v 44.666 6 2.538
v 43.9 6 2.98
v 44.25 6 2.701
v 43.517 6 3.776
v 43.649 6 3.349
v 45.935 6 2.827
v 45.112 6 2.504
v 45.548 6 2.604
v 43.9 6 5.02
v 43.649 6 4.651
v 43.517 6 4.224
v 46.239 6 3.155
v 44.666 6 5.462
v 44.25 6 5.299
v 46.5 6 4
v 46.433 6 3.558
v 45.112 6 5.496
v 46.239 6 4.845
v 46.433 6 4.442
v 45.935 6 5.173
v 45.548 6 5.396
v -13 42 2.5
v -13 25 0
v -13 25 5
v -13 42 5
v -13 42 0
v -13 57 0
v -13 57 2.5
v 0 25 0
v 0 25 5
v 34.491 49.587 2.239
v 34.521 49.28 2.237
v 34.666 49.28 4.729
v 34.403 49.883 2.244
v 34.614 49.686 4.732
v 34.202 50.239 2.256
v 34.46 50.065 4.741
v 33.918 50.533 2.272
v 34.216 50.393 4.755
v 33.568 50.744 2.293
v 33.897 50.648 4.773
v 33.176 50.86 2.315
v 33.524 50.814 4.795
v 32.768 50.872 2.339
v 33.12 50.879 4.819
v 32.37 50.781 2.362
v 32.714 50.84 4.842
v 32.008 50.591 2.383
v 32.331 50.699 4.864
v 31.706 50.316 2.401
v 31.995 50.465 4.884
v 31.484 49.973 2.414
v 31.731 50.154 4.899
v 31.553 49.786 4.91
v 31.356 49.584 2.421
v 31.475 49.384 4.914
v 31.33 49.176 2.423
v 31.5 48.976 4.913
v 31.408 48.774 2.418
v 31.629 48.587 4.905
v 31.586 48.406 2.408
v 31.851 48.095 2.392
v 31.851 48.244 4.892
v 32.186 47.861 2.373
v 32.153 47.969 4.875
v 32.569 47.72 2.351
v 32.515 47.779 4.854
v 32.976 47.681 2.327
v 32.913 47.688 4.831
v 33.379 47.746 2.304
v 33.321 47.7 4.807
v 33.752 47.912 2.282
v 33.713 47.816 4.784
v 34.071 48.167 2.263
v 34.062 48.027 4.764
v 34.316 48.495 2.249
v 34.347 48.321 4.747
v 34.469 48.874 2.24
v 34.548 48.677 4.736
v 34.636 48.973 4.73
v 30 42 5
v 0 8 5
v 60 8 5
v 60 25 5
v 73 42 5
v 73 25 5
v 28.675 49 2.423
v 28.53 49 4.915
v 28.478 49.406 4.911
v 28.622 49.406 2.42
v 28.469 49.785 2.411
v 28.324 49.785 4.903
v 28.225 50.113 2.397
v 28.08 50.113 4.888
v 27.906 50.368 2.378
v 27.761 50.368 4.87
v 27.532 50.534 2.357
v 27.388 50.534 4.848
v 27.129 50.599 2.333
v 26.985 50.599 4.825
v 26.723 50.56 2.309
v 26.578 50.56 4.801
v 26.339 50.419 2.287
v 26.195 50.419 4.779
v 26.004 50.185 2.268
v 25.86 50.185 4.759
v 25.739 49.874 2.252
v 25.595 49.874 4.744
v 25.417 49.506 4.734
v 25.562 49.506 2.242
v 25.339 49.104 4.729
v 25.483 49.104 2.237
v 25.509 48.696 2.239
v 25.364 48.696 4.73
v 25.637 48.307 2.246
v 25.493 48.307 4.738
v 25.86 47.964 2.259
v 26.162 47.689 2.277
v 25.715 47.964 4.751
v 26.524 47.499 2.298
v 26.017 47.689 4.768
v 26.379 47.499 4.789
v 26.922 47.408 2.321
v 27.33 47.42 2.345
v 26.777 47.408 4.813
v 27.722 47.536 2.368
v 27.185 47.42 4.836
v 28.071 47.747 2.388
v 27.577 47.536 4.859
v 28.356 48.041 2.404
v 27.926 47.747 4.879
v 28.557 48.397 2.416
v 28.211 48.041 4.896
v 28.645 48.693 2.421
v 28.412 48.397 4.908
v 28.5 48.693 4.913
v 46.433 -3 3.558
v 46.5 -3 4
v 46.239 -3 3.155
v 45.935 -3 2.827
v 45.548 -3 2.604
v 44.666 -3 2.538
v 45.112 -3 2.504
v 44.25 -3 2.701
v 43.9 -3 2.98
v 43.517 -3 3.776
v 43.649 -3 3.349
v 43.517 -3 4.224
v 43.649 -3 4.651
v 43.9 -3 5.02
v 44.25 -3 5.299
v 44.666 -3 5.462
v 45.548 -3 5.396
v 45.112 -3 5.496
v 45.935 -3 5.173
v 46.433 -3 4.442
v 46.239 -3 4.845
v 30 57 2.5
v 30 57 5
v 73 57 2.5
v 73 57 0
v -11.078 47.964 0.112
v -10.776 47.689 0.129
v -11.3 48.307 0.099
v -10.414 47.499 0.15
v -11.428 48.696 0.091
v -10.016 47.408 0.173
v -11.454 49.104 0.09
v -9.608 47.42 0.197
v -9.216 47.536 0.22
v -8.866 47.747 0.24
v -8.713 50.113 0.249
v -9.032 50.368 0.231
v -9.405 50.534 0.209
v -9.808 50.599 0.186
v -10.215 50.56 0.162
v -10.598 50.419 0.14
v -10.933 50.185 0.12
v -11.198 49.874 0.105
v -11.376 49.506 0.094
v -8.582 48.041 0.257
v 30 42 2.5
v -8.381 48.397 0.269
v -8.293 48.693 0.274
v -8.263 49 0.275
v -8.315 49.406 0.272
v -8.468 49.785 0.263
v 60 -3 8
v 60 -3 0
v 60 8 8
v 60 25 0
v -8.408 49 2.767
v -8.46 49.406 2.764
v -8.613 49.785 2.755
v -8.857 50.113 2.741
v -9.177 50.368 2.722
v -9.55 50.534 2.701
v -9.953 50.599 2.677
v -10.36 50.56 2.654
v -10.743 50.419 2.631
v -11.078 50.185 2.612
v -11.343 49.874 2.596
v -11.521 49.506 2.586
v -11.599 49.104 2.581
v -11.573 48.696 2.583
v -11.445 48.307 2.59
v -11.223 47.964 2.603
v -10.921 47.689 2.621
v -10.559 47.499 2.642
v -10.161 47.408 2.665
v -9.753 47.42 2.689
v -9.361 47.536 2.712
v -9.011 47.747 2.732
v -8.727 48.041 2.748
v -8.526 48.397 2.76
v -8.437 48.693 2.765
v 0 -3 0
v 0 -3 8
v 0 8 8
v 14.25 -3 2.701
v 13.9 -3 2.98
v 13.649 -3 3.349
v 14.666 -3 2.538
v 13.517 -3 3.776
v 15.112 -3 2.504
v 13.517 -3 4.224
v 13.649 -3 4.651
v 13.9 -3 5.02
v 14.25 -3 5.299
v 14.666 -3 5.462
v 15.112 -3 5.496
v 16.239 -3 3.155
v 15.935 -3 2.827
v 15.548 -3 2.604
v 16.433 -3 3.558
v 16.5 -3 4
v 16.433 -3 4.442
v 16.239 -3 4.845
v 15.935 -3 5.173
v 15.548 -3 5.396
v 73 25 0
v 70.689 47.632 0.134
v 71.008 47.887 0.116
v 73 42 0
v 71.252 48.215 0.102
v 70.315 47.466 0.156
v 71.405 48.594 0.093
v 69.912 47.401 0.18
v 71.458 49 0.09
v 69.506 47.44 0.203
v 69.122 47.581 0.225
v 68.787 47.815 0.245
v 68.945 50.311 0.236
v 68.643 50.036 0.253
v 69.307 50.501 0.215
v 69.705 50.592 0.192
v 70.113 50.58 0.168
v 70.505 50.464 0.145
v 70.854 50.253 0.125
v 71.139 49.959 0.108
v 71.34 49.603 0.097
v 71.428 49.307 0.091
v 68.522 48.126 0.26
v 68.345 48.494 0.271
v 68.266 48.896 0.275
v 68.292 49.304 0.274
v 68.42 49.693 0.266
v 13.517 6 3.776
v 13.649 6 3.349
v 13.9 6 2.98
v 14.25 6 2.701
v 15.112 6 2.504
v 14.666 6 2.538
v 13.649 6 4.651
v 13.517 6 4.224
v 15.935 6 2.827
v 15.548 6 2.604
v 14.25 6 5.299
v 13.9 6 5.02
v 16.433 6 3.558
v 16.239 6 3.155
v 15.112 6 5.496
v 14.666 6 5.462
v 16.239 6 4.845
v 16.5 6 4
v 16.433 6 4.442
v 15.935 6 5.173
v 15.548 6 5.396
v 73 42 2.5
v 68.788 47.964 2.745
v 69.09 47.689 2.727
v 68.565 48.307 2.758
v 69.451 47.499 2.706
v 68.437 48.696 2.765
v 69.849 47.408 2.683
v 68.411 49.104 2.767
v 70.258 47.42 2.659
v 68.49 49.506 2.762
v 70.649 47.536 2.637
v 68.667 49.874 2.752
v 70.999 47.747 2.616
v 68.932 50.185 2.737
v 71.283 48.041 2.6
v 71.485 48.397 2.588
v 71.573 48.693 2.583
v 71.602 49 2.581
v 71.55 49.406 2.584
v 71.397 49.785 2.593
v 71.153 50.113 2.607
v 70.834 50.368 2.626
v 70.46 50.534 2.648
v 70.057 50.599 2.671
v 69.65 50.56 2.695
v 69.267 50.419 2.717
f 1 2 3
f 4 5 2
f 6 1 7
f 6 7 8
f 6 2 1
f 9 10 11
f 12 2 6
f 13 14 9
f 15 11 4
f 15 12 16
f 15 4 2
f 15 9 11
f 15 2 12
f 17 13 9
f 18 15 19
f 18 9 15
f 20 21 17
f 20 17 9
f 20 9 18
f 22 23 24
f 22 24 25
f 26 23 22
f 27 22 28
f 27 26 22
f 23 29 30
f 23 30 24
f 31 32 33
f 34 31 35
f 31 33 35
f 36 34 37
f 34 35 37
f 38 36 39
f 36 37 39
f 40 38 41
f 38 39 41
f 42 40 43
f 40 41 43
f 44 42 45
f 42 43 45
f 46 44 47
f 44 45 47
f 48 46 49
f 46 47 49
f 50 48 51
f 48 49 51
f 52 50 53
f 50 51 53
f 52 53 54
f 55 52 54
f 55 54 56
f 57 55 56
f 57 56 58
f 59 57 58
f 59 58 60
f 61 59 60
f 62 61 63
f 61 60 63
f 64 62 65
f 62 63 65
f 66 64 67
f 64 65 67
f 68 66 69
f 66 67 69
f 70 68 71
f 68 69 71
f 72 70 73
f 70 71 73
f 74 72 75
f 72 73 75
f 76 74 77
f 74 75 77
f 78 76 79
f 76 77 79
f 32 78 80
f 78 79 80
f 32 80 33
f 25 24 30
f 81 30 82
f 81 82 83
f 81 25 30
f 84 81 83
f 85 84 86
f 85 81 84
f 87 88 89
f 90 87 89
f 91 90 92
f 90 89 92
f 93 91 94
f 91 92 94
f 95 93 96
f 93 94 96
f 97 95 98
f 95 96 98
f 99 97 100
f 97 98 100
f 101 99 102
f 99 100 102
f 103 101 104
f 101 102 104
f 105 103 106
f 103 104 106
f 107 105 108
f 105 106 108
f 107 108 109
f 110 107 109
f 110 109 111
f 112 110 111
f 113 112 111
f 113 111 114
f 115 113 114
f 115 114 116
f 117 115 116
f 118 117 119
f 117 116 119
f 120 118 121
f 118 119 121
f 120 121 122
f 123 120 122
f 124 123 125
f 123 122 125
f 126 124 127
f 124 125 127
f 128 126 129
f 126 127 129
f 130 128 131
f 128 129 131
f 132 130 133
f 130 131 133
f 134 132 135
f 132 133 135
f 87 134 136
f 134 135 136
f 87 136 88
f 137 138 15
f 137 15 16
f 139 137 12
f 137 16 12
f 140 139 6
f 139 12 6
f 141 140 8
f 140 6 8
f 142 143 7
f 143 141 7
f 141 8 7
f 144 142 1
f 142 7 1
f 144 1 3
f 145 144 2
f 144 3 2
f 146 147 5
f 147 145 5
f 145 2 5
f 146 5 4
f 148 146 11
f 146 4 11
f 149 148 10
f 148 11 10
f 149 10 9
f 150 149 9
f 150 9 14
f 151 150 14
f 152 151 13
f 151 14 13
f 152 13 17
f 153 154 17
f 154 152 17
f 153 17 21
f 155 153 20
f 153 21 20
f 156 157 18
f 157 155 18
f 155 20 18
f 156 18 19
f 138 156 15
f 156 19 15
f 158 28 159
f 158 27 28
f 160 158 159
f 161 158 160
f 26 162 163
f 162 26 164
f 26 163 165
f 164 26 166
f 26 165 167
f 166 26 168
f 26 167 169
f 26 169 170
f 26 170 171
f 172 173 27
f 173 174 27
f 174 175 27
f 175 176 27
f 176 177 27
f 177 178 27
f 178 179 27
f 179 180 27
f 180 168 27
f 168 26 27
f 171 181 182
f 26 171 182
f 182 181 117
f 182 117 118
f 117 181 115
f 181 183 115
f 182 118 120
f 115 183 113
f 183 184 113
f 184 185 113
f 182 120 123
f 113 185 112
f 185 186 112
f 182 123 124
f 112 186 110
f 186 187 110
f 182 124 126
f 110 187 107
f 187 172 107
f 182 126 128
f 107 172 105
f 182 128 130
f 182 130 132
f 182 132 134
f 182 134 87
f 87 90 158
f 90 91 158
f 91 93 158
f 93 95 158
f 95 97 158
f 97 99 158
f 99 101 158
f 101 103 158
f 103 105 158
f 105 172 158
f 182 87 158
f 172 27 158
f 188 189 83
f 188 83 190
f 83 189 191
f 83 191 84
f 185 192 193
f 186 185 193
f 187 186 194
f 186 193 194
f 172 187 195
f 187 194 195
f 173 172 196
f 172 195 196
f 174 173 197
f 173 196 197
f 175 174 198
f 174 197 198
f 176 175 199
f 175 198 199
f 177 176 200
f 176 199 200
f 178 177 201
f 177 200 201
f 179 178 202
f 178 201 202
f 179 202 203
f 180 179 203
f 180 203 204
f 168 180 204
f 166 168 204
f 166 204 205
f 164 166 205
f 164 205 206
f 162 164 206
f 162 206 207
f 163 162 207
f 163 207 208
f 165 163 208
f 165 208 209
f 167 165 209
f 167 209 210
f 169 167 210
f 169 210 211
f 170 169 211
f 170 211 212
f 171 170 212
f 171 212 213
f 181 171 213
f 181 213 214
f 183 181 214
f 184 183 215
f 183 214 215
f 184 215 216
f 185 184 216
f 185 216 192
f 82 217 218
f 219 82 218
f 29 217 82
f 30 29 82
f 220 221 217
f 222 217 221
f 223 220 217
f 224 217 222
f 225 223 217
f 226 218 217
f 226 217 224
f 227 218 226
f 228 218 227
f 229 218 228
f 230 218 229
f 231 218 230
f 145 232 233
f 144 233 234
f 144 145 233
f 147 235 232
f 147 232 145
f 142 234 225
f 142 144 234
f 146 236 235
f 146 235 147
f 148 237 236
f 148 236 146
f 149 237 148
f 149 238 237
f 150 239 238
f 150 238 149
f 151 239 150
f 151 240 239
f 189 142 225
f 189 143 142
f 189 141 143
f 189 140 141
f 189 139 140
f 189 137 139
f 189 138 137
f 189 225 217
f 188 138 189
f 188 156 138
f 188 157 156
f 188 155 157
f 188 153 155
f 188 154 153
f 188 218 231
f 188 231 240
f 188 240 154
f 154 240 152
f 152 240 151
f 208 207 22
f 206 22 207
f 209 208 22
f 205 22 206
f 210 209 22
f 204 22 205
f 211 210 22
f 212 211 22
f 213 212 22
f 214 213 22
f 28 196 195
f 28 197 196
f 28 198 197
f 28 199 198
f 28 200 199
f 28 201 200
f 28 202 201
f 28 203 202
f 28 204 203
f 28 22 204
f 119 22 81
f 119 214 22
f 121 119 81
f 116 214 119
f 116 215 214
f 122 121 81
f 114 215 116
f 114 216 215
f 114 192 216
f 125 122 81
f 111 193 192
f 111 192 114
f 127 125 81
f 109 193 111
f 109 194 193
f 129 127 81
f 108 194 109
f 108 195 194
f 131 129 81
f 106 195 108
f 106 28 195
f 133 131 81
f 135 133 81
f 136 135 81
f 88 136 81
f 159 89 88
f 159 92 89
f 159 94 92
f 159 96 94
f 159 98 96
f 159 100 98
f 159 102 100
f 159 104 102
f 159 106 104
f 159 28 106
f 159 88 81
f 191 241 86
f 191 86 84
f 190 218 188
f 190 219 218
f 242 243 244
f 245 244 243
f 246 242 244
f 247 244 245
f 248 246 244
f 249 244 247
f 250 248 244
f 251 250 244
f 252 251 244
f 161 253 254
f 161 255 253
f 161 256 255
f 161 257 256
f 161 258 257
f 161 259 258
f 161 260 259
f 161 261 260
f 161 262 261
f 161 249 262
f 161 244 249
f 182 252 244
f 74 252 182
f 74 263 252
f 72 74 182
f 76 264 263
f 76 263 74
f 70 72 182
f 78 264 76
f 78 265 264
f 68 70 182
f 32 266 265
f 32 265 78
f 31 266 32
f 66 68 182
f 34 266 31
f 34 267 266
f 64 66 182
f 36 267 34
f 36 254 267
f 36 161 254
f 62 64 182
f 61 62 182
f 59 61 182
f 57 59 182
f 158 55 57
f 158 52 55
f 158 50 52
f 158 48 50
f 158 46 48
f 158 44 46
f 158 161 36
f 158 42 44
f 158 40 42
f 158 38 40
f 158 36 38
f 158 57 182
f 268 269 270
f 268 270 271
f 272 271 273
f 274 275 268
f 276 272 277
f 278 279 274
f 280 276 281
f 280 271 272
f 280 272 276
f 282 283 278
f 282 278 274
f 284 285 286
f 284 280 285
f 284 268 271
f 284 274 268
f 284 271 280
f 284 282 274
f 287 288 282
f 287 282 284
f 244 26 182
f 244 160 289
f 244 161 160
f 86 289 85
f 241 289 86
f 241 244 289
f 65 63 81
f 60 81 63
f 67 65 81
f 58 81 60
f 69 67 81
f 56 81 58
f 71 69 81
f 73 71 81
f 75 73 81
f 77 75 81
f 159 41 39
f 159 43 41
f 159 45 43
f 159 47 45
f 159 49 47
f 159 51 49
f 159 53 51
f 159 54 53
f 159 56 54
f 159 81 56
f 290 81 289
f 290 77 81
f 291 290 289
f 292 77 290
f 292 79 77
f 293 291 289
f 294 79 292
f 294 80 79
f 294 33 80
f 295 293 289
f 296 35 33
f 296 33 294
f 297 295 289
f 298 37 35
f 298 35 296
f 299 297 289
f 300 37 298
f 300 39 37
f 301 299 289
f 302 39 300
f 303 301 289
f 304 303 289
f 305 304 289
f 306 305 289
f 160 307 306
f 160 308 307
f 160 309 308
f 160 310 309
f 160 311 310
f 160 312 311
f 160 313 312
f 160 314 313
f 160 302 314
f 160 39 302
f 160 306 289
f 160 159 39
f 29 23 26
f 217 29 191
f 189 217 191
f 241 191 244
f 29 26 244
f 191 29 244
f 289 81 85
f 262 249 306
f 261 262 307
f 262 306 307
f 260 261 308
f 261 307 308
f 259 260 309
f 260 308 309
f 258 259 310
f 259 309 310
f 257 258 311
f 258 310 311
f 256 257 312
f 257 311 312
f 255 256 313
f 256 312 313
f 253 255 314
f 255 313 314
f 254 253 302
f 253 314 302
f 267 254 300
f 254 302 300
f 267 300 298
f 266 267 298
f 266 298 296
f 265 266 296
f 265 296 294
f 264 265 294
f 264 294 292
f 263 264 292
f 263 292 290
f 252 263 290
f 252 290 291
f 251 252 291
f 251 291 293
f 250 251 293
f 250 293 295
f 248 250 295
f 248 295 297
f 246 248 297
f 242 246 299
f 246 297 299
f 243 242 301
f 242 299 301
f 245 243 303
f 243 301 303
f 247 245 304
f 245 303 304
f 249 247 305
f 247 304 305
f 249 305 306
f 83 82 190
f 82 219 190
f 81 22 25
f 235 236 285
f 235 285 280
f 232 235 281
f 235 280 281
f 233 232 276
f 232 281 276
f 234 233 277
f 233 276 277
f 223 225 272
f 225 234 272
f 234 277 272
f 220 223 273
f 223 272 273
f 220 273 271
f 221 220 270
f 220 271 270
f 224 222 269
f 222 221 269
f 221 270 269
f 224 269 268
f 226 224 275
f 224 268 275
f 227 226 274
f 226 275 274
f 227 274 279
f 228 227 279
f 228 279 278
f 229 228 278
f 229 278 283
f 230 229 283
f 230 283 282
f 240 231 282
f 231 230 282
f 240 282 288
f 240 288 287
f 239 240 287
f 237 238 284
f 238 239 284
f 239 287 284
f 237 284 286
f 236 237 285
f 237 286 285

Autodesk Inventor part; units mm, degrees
ref_plane "YZ Plane" through (0, 0, 0) normal (1, 0, 0) x (0, 1, 0)
ref_plane "XZ Plane" through (0, 0, 0) normal (0, 1, 0) x (-1, 0, 0)
ref_plane "XY Plane" through (0, 0, 0) normal (0, 0, 1) x (1, 0, 0)
sketch "스케치1" plane through (0, 0, 0) normal (0, 0, 1) x (1, 0, 0)
  line L0 (0, 0) -> (60, 0)
  line L1 (60, 0) -> (60, 25)
  line L2 (60, 57) -> (0, 57)
  line L3 (0, 25) -> (0, 0)
  line L4 (-13, 57) -> (73, 57)
  line L5 (73, 57) -> (73, 25)
  line L6 (-13, 25) -> (-13, 57)
  line L7 (73, 25) -> (60, 25)
  line L8 (0, 25) -> (-13, 25)
  dimension "d0" = 60
  dimension "d1" = 57
  dimension "d3" = 86
  dimension "d4" = 32
  dimension "d5" = 13
extrude "돌출1" add sketch "스케치1" along normal blind 8
sketch "스케치2" plane through (0, 0, 8) normal (0, 0, 1) x (1, 0, 0)
  line L0 (0, 0) -> (60, 0) projected
  line L1 (60, 0) -> (60, 25) projected
  line L2 (60, 25) -> (73, 25) projected
  line L3 (73, 25) -> (73, 57) projected
  line L4 (73, 57) -> (-13, 57) projected
  line L5 (-13, 57) -> (-13, 25) projected
  line L6 (-13, 25) -> (0, 25) projected
  line L7 (0, 25) -> (0, 0) projected
  line L8 (0, 25) -> (0, 0) projected
  line L9 (0, 8) -> (60, 8)
  line L10 (60, 8) -> (60, 0)
  line L11 (60, 0) -> (0, 0)
  line L12 (0, 0) -> (0, 8)
  dimension "d9" = 8
  dimension "d10" = 0
extrude "돌출2" cut sketch "스케치2" against normal blind 3 contours L7 L6 L5 L4 L3 L2 L1 L9
sketch "스케치4" plane through (0, 0, 0) normal (0, -1, 0) x (1, 0, 0)
  line L0 (0, 0) -> (60, 0) projected
  line L1 (60, 0) -> (60, 8) projected
  line L2 (0, 8) -> (60, 8) projected
  line L3 (0, 0) -> (0, 8) projected
  circle A0 centre (45, 4) radius 1.5
  circle A1 centre (15, 4) radius 1.5
  dimension "d15" = 3
  dimension "d16" = 3
  dimension "d17" = 4
  dimension "d18" = 15
  dimension "d19" = 4
  dimension "d20" = 15
extrude "돌출4" cut sketch "스케치4" against normal blind 6 contours A0 | A1
sketch "스케치11" plane through (-13, 57, 5) normal (0, 1, 0) x (1, 0, 0)
  line L0 (0, 0) -> (86, 0) projected
  line L1 (86, 5) -> (86, 0) projected
  line L2 (86, 5) -> (0, 5) projected
  line L3 (0, 5) -> (0, 0) projected
  line L4 (0, 2.5) -> (43, 0)
  line L5 (0, 0) -> (86, 0) projected
  line L6 (73, 5) -> (86, 5) projected
  line L7 (43, 0) -> (43, 2.5)
  line L8 (86, 5) -> (0, 5) projected
  line L9 (86, 5) -> (43, 2.5)
  line L10 (0, 5) -> (43, 2.5)
  line L11 (43, 0) -> (86, 2.5)
  line L12 (86, 5) -> (86, 0) projected
  line L13 (86, 2.5) -> (86, 5)
  point P0 (13, 5)
extrude "돌출7" cut sketch "스케치11" against normal blind 15 contours L3 L4 L0 | L11 L1 L0 | L10 L2 L9
sketch "스케치13" plane through (-13, 57, 2.5) normal (-0.058, 0, 0.9983) x (0.9983, 0, 0.058)
  circle A0 centre (3, -8) radius 1.6
  circle A1 centre (40, -8) radius 1.6
  line L0 (0, -15) -> (0, 0) projected
  line L1 (0, 0) -> (43.0726, 0) projected
  line L2 (42.9275, -15) -> (-0.1451, -15) projected
  point P0 (12.833, -57)
  dimension "d53" = 3.2
  dimension "d54" = 3.2
  dimension "d55" = 37
  dimension "d56" = 3
  dimension "d57" = 8
  dimension "d58" = 7
extrude "돌출8" cut sketch "스케치13" against normal blind 3
sketch "스케치15" plane through (0, 0, 0) normal (0, -1, 0) x (1, 0, 0)
  circle A0 centre (45, 4) radius 1.5 projected
  circle A1 centre (15, 4) radius 1.5 projected
  line L0 (0, 0) -> (60, 0) projected
  line L1 (60, 0) -> (60, 8) projected
  line L2 (0, 8) -> (60, 8) projected
  line L3 (0, 0) -> (0, 8) projected
extrude "돌출11" add sketch "스케치15" along normal blind 3
sketch "스케치16" plane through (30, 42, 5) normal (0.058, 0, 0.9983) x (0.9983, 0, -0.058)
  circle A0 centre (40.0726, 7) radius 1.6
  circle A1 centre (3.0737, 7.28) radius 1.6
  line L0 (0, 15) -> (43.0726, 15) projected
  line L1 (43.0726, 15) -> (43.0726, 0) projected
  point P0 (-29.6592, -42)
  dimension "d71" = 3.2
  dimension "d72" = 3.2
  dimension "d73" = 8
  dimension "d74" = 7.72
  dimension "d75" = 37
  dimension "d76" = 3
extrude "돌출12" cut sketch "스케치16" against normal blind 10
properties part number "앞뒷면PSD받침대_수정" material "ABS 플라스틱"
